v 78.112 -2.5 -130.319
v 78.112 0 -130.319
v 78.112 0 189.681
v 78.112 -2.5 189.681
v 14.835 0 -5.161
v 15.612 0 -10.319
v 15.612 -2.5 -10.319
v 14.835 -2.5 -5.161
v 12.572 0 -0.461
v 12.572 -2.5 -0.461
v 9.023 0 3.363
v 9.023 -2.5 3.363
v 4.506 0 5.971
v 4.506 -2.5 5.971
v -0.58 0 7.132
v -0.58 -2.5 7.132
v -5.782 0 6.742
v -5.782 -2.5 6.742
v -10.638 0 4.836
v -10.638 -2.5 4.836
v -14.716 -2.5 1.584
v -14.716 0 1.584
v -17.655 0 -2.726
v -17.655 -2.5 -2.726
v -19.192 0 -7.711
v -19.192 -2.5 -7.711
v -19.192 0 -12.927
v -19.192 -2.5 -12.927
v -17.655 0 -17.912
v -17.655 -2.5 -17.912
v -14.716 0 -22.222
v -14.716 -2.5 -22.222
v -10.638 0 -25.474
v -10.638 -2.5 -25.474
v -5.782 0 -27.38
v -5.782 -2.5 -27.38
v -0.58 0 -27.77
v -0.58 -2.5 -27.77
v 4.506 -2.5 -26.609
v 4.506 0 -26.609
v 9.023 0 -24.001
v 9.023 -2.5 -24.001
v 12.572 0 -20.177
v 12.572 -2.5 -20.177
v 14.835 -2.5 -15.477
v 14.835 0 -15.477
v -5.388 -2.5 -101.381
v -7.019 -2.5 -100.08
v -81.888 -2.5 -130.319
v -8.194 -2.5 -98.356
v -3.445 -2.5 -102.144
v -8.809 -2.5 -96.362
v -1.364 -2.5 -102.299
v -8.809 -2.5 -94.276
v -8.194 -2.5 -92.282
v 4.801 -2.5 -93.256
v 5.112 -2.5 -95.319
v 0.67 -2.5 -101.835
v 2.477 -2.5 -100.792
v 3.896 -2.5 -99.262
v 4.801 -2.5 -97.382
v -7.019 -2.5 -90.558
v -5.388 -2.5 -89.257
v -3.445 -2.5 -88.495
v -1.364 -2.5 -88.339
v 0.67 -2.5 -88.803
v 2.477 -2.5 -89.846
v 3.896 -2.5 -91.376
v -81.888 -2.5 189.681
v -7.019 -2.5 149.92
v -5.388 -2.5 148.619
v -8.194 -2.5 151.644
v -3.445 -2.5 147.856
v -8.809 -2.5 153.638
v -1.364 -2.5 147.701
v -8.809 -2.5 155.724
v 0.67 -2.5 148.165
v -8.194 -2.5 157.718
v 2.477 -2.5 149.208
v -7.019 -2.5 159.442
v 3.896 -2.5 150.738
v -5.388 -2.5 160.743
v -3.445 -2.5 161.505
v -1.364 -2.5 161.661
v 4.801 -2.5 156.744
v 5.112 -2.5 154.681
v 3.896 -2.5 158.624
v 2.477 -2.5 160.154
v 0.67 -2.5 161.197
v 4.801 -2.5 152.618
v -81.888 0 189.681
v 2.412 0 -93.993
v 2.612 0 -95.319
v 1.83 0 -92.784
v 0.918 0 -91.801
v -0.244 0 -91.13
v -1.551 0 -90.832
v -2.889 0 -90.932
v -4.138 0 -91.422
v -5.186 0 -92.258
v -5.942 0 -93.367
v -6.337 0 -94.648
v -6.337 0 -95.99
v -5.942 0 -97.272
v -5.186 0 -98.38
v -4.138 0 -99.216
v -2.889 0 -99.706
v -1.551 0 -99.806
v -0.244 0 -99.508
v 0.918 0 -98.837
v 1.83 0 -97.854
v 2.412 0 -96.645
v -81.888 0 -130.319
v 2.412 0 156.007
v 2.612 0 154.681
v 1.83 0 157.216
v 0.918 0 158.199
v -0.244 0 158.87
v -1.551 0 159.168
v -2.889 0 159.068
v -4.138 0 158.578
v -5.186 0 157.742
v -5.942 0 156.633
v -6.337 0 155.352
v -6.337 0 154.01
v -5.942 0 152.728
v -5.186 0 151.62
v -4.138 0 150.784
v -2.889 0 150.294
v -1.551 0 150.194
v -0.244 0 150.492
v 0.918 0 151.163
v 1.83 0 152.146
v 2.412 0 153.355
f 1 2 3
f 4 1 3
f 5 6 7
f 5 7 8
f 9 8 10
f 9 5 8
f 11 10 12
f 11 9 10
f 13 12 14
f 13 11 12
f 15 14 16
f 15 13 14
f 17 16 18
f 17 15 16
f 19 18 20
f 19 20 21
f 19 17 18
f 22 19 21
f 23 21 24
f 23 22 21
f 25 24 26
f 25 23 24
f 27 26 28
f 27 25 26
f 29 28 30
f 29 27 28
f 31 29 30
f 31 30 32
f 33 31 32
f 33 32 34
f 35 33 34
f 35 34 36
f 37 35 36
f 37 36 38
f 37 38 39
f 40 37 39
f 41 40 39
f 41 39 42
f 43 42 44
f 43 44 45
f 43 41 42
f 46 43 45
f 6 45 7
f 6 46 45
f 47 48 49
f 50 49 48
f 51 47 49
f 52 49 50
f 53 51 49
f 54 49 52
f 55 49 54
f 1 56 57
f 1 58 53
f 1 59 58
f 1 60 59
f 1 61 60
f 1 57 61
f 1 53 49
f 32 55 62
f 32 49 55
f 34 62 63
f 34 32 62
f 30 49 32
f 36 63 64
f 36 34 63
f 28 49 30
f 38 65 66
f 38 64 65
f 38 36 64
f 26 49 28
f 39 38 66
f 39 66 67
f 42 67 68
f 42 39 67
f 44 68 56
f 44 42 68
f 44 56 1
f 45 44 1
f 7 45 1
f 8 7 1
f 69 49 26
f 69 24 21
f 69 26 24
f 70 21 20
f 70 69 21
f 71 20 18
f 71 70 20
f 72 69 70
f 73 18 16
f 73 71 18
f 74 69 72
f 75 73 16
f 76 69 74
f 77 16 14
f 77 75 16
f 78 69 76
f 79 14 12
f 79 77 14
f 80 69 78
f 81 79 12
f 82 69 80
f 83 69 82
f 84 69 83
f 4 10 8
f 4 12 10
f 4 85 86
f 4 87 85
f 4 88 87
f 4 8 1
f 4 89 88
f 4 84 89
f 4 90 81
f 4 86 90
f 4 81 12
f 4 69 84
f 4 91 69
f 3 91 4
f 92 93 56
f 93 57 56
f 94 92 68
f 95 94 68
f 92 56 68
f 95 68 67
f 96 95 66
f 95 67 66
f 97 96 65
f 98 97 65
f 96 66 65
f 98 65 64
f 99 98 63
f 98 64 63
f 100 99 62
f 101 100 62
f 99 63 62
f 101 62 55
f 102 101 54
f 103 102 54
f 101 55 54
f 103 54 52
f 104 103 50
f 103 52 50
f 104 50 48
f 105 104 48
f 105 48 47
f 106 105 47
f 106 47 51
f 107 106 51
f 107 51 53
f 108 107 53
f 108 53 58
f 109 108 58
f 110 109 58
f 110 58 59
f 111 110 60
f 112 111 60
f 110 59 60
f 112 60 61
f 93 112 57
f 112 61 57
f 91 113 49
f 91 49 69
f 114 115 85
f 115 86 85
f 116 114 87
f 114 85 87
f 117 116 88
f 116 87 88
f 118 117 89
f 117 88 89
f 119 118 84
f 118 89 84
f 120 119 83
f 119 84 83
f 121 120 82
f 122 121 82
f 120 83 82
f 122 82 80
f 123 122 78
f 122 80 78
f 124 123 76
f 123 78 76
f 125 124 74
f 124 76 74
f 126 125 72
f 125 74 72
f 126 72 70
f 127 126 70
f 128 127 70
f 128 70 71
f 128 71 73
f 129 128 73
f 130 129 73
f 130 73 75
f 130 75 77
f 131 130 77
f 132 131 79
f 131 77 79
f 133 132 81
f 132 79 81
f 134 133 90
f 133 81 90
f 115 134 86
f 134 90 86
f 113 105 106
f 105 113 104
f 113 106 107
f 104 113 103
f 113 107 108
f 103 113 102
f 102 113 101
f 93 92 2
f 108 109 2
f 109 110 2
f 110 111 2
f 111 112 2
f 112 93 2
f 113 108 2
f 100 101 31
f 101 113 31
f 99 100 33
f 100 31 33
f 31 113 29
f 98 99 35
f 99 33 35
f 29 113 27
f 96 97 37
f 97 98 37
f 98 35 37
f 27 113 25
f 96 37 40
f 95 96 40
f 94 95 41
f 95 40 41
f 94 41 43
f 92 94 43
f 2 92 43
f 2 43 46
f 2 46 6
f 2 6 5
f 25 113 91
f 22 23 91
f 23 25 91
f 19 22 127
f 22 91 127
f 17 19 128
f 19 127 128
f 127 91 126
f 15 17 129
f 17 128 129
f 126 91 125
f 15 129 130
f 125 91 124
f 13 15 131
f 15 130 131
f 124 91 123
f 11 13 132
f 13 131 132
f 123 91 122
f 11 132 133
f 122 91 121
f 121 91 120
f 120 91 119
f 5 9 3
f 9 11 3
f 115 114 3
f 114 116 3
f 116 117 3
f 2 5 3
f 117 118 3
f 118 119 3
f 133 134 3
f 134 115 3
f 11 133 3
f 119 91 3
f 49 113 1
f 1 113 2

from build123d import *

# Parameters (mm, degrees)
F0_W     = 160
F0_H     = 320
F0_R     = 3
F0_R_2   = 17.5
F1_DEPTH = 2.5


# Not quite as in the source:
# - a fillet or chamfer that OpenCascade refuses, or shapes differently, is made with other operations: its cross-section is extruded or revolved along the edge and cut away or added


with BuildPart() as f1:
    # F0 (on Front) → F1 (new body)
    with BuildSketch(Plane.XZ):
        with Locations((-1.8876045942, 29.6809725389)):
            Rectangle(F0_W, F0_H)
        with Locations((-1.8876045942, -95.3190274611)):
            Circle(F0_R, mode=Mode.SUBTRACT)
        with Locations((-1.8876045942, -10.3190274611)):
            Circle(F0_R_2, mode=Mode.SUBTRACT)
        with Locations((-1.8876045942, 154.6809725389)):
            Circle(F0_R, mode=Mode.SUBTRACT)
    extrude(amount=F1_DEPTH)

    # F2: chamfer of 4 on 2 edges, made by hand

    # F2_s1 → F2_t2 (revolve, cut)
    with BuildSketch(Plane.XY.offset(154.6809725389)):
        Polygon((1.1123954058, 1.5), (5.1123954058, -2.5), (1.1123954058, -2.5), align=None)
    revolve(axis=Axis((-1.8876045942, -2.5, 154.6809725389), (0, -1, 0)), mode=Mode.SUBTRACT)

    # F2_s3 → F2_t4 (revolve, cut)
    with BuildSketch(Plane.XY.offset(-95.3190274611)):
        Polygon((1.1123954058, 1.5), (5.1123954058, -2.5), (1.1123954058, -2.5), align=None)
    revolve(axis=Axis((-1.8876045942, -2.5, -95.3190274611), (0, -1, 0)), mode=Mode.SUBTRACT)


solid = f1.part
